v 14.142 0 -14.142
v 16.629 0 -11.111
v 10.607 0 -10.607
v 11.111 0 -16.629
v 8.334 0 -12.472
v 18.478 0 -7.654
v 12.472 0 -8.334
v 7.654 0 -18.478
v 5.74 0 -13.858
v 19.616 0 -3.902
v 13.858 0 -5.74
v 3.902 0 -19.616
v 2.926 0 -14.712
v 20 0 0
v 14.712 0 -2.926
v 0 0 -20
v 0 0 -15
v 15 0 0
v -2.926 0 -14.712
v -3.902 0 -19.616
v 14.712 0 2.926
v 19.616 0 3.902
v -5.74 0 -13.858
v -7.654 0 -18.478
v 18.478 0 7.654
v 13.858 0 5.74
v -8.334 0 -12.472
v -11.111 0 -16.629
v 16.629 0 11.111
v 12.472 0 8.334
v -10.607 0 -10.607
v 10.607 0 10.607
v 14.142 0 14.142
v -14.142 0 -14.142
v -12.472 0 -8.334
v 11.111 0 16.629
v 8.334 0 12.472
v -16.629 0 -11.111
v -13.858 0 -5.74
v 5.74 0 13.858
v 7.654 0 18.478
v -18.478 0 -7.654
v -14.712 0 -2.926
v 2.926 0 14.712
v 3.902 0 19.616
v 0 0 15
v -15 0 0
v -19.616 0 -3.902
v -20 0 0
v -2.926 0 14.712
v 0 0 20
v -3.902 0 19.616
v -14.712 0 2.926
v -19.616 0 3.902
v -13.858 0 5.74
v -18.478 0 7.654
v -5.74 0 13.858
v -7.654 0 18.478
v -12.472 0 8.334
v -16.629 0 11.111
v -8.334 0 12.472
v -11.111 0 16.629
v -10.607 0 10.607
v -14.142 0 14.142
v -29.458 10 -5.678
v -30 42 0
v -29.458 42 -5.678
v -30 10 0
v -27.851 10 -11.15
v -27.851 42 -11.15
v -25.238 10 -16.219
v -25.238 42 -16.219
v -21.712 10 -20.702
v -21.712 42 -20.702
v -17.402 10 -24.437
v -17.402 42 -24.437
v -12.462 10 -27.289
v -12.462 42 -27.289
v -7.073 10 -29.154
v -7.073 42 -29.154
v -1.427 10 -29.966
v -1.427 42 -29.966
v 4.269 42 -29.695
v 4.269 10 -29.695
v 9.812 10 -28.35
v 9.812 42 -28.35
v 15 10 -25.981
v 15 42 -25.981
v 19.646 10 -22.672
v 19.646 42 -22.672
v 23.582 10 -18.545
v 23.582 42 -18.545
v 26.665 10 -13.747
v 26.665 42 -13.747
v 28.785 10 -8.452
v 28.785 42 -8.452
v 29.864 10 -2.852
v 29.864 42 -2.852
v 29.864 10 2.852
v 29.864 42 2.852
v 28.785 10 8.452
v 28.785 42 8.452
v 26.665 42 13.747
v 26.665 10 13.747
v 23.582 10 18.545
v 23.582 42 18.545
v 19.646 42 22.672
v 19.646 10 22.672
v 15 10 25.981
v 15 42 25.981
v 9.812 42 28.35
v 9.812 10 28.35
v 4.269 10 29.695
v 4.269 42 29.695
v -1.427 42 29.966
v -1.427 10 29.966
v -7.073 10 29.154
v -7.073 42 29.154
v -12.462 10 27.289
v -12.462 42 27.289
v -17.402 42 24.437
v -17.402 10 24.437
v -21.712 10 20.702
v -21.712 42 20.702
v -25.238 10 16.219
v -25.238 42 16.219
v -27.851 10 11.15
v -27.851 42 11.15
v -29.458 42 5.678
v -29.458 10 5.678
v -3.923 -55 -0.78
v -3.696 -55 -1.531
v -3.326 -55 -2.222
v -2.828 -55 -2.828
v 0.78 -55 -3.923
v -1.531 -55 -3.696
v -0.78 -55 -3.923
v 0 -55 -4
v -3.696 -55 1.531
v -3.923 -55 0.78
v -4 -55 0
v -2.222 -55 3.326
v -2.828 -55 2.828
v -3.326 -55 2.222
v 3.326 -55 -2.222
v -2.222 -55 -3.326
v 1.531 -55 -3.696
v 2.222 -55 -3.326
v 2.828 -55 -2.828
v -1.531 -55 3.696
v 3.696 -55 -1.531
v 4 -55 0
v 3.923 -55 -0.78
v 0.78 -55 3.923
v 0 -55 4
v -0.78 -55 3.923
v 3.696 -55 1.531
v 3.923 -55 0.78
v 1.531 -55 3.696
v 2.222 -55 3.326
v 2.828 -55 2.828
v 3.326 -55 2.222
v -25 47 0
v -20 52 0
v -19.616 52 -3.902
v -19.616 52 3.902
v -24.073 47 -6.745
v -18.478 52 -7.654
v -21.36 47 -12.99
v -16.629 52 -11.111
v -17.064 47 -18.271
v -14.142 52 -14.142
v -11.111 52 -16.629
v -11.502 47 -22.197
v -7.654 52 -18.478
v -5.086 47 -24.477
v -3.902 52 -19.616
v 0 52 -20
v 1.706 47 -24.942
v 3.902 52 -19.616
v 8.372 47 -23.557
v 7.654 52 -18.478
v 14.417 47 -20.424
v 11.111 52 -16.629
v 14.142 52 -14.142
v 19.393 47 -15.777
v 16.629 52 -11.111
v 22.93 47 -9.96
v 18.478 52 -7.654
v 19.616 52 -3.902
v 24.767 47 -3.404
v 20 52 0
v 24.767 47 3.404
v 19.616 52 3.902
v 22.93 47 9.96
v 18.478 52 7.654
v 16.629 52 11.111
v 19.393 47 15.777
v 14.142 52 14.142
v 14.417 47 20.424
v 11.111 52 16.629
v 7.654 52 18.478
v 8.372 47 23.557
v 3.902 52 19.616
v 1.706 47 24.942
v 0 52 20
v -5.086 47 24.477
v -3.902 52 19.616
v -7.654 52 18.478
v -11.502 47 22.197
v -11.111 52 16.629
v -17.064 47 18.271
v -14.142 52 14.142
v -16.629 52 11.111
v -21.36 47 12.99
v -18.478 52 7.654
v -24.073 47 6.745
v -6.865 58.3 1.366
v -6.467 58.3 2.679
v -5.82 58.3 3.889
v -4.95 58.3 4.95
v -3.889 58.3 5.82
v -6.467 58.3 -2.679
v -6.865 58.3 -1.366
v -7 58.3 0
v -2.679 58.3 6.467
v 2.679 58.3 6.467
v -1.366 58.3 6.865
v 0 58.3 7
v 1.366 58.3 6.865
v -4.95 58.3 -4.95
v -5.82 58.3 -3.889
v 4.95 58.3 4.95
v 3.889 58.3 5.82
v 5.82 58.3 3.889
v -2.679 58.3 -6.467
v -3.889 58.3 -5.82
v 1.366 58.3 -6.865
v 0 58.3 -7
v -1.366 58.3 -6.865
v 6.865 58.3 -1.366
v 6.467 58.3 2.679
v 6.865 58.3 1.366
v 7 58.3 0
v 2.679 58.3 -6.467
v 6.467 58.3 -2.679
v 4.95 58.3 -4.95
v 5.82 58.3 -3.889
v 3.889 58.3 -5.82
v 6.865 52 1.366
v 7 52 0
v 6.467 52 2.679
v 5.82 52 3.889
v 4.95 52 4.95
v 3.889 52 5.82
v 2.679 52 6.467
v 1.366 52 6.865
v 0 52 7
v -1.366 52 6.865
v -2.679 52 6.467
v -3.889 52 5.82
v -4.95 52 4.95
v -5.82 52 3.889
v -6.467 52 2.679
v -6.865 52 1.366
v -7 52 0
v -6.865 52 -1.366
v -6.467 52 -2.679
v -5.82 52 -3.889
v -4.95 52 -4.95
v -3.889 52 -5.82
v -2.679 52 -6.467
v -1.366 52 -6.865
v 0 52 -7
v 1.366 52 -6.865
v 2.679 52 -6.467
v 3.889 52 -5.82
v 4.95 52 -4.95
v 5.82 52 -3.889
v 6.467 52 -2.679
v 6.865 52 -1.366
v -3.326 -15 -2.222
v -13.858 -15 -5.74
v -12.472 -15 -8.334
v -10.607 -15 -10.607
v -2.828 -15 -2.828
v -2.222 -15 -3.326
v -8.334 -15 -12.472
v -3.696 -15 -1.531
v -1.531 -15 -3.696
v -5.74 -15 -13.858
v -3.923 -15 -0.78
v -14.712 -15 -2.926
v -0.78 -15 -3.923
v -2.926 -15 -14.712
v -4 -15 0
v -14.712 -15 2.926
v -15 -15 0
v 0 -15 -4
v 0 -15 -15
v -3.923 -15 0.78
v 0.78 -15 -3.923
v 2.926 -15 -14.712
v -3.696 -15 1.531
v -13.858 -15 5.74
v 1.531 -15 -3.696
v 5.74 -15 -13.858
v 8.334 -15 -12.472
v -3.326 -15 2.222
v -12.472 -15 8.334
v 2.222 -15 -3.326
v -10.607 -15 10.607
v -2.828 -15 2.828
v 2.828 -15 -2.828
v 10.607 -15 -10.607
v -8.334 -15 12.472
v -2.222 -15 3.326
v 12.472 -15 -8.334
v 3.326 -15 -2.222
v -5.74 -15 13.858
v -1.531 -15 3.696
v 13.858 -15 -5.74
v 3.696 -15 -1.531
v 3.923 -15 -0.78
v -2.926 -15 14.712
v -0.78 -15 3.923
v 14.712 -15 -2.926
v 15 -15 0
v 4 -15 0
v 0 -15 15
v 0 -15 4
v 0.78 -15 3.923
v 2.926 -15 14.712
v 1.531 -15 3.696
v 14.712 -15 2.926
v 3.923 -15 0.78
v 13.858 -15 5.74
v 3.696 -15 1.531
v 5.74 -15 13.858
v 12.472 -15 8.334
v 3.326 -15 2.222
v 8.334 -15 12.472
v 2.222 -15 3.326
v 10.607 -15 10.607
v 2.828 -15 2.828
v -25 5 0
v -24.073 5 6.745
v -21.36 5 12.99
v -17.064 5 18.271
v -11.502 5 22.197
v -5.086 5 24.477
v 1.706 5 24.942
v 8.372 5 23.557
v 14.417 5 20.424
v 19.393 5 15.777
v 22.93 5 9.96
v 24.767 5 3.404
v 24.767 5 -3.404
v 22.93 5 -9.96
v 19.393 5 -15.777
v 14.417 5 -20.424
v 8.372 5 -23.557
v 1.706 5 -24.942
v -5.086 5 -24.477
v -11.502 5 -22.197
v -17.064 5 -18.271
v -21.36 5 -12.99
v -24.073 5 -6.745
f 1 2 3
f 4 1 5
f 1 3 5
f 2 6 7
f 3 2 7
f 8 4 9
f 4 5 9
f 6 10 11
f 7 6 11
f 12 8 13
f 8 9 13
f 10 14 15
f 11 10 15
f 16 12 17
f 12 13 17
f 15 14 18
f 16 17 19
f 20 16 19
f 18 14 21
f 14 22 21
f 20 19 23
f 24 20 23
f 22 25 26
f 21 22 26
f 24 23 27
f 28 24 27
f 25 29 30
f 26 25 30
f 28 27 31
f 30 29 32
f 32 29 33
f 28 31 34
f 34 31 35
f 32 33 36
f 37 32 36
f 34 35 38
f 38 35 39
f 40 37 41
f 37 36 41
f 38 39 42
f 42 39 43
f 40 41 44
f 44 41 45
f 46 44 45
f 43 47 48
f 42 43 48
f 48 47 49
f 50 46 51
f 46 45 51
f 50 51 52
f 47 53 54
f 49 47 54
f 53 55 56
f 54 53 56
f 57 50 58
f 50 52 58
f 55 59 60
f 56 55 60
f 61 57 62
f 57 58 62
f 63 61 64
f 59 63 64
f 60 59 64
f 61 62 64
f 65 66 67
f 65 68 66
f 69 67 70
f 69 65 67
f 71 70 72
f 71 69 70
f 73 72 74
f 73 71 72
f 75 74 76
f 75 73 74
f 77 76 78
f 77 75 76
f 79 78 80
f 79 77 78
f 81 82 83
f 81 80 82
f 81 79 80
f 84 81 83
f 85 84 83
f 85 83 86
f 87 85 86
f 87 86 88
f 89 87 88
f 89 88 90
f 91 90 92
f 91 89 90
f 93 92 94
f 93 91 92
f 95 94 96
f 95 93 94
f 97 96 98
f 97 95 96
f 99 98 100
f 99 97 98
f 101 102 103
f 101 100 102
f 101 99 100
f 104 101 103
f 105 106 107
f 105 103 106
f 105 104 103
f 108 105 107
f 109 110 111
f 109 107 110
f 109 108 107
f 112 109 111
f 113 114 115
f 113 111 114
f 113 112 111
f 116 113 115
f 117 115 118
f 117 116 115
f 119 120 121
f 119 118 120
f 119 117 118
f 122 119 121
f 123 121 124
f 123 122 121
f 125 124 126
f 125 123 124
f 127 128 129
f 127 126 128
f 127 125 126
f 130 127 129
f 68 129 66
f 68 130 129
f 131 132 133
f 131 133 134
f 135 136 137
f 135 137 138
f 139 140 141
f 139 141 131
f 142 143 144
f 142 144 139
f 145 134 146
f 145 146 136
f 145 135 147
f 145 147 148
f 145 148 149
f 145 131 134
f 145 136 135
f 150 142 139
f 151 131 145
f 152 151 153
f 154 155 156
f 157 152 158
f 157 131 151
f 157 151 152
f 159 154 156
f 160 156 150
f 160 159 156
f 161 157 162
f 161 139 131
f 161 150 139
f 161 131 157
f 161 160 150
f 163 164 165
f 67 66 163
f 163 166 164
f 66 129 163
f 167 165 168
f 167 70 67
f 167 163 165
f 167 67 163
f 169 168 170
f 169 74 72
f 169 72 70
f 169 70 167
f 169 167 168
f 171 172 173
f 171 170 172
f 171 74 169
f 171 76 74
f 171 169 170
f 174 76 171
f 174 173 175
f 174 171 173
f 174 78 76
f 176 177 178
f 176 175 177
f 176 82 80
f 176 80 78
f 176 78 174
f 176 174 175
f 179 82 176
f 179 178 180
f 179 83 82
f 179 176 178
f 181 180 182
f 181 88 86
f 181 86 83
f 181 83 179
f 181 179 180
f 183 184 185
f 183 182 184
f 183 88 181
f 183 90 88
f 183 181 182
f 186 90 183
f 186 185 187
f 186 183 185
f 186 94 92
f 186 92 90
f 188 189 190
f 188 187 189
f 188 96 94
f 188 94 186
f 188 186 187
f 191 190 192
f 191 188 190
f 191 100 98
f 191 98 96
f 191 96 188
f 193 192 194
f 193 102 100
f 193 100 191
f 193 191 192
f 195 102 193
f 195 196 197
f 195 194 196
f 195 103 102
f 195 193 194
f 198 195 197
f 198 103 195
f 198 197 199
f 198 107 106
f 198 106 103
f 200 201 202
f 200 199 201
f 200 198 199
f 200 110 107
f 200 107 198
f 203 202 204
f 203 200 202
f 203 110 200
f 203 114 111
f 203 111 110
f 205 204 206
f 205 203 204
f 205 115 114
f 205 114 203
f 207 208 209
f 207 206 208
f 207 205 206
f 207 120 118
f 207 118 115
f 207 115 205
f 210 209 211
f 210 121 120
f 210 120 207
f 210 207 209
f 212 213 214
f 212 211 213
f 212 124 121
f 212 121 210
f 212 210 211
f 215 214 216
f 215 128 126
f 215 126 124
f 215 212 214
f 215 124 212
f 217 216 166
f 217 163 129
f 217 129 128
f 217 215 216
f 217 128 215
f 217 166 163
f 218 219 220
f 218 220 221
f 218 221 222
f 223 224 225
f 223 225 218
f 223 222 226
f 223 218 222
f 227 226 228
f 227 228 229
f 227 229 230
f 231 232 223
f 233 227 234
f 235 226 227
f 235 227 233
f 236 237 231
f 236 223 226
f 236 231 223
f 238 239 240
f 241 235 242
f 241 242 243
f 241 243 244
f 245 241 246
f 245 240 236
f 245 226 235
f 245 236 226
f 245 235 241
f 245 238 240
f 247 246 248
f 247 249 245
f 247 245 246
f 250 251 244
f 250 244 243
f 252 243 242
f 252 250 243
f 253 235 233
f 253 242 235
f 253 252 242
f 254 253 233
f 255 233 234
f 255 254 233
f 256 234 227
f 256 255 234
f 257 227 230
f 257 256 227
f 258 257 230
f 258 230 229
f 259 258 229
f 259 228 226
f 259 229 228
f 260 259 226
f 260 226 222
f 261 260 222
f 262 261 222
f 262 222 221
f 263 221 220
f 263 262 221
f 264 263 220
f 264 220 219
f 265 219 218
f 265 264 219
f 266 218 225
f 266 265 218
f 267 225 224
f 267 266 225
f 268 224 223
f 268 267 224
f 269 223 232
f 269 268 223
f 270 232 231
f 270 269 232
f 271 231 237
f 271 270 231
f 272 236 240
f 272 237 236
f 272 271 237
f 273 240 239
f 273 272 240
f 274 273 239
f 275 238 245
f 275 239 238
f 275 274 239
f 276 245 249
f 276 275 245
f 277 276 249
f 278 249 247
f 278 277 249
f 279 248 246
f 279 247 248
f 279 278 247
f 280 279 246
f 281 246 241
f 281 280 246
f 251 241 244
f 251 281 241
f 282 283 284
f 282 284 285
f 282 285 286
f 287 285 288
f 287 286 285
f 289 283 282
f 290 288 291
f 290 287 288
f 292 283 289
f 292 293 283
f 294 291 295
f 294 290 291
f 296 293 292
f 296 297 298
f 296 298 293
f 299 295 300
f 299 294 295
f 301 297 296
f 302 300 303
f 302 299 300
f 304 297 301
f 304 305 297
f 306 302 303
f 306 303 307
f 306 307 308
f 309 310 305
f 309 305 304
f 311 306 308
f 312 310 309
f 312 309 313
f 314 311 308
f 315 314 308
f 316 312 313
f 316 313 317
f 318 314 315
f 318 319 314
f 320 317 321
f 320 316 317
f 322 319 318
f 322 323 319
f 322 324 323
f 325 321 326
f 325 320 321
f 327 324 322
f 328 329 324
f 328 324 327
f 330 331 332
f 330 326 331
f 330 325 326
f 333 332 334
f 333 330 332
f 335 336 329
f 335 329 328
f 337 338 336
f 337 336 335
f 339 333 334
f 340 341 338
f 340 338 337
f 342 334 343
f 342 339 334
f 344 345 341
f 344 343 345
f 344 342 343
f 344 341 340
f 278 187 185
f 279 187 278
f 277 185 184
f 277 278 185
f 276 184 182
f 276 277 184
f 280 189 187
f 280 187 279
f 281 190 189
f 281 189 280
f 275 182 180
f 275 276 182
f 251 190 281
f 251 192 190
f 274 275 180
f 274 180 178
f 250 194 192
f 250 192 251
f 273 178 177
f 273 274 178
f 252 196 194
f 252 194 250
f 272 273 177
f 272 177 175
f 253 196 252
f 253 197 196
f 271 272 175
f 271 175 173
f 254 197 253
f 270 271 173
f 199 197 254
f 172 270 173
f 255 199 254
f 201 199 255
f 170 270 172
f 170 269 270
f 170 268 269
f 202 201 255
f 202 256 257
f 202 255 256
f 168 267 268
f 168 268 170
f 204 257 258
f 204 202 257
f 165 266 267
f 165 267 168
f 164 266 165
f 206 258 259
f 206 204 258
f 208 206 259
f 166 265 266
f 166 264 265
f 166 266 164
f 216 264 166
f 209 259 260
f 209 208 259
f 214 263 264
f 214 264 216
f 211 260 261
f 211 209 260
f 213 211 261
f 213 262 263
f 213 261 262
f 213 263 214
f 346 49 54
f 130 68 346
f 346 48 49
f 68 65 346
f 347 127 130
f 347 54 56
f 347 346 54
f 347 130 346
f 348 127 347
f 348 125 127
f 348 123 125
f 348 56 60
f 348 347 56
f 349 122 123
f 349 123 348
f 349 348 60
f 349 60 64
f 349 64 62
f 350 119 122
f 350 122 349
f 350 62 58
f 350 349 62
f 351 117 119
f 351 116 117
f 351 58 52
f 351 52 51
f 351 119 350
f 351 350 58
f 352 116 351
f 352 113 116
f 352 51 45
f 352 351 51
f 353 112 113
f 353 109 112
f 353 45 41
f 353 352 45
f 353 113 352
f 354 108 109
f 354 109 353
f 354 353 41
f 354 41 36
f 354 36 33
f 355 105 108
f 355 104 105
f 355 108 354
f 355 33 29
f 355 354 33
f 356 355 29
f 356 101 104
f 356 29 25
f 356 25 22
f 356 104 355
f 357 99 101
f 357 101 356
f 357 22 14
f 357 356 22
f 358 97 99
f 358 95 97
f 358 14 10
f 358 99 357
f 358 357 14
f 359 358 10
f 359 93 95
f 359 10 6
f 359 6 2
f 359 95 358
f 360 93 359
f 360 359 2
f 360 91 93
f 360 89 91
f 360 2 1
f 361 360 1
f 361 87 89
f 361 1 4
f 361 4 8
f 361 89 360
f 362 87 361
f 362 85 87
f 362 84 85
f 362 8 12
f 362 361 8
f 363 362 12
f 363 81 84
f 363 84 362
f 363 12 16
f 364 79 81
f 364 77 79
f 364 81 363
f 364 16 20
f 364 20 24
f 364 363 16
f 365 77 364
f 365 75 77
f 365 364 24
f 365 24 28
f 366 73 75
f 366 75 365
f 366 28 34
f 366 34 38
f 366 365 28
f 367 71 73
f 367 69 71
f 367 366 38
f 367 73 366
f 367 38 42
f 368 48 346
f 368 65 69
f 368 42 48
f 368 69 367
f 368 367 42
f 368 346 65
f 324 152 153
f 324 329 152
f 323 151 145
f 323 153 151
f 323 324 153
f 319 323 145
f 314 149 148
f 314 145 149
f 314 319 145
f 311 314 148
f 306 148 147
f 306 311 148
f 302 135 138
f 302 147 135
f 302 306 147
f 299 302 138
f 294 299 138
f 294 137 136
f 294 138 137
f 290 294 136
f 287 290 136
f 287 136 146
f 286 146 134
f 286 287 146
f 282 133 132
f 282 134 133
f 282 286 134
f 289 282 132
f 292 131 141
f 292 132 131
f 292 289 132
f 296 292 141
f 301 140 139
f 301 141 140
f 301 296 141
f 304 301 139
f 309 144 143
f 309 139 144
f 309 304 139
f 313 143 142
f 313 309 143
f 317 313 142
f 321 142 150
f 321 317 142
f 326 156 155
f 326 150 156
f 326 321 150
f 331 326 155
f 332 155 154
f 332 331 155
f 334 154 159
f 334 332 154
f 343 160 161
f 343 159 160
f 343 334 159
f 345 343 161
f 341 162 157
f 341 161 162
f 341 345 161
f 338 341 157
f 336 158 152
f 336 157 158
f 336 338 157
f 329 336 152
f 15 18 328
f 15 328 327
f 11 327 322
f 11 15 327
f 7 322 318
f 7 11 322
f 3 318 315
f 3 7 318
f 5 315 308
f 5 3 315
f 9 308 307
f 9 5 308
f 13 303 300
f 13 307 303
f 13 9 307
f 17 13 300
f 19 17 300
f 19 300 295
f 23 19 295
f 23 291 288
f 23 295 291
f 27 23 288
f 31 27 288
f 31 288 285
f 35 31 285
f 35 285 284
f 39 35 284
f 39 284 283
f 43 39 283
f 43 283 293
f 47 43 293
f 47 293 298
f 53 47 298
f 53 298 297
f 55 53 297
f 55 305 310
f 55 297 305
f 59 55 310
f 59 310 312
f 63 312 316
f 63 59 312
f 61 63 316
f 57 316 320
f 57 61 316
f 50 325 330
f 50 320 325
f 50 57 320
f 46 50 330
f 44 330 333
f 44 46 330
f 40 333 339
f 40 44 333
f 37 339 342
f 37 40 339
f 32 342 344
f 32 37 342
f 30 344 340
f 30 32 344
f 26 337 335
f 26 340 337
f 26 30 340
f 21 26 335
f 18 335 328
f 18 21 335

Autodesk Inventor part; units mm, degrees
ref_plane "YZ Plane" through (0, 0, 0) normal (1, 0, 0) x (0, 1, 0)
ref_plane "XZ Plane" through (0, 0, 0) normal (0, 1, 0) x (-1, 0, 0)
ref_plane "XY Plane" through (0, 0, 0) normal (0, 0, 1) x (1, 0, 0)
sketch "Sketch1" plane through (0, 0, 0) normal (0, 1, 0) x (-1, 0, 0)
  circle A0 centre (0, 0) radius 30
  dimension "d0" = 60
extrude "Extrusion1" add sketch "Sketch1" along normal blind 52
sketch "Sketch2" plane through (0, 52, 0) normal (0, 1, 0) x (1, 0, 0)
  circle A0 centre (0, 0) radius 7
  dimension "d3" = 14
extrude "Extrusion2" add sketch "Sketch2" along normal blind 6.3
sketch "Sketch3" plane through (0, 0, 0) normal (0, -1, 0) x (1, 0, 0)
  circle A0 centre (0, 0) radius 15
  dimension "d6" = 30
extrude "Extrusion3" add sketch "Sketch3" along normal blind 15
sketch "Sketch4" plane through (0, -15, 0) normal (0, -1, 0) x (1, 0, 0)
  circle A0 centre (0, 0) radius 4
  dimension "d9" = 8
extrude "Extrusion4" add sketch "Sketch4" along normal blind 40
chamfer "Chamfer1" distance 10 angle 45 1 edges at (30, 0, 0)
chamfer "Chamfer2" distance 10 angle 45 1 edges at (30, 52, 0)
properties part number "KV200_T_Motor"
